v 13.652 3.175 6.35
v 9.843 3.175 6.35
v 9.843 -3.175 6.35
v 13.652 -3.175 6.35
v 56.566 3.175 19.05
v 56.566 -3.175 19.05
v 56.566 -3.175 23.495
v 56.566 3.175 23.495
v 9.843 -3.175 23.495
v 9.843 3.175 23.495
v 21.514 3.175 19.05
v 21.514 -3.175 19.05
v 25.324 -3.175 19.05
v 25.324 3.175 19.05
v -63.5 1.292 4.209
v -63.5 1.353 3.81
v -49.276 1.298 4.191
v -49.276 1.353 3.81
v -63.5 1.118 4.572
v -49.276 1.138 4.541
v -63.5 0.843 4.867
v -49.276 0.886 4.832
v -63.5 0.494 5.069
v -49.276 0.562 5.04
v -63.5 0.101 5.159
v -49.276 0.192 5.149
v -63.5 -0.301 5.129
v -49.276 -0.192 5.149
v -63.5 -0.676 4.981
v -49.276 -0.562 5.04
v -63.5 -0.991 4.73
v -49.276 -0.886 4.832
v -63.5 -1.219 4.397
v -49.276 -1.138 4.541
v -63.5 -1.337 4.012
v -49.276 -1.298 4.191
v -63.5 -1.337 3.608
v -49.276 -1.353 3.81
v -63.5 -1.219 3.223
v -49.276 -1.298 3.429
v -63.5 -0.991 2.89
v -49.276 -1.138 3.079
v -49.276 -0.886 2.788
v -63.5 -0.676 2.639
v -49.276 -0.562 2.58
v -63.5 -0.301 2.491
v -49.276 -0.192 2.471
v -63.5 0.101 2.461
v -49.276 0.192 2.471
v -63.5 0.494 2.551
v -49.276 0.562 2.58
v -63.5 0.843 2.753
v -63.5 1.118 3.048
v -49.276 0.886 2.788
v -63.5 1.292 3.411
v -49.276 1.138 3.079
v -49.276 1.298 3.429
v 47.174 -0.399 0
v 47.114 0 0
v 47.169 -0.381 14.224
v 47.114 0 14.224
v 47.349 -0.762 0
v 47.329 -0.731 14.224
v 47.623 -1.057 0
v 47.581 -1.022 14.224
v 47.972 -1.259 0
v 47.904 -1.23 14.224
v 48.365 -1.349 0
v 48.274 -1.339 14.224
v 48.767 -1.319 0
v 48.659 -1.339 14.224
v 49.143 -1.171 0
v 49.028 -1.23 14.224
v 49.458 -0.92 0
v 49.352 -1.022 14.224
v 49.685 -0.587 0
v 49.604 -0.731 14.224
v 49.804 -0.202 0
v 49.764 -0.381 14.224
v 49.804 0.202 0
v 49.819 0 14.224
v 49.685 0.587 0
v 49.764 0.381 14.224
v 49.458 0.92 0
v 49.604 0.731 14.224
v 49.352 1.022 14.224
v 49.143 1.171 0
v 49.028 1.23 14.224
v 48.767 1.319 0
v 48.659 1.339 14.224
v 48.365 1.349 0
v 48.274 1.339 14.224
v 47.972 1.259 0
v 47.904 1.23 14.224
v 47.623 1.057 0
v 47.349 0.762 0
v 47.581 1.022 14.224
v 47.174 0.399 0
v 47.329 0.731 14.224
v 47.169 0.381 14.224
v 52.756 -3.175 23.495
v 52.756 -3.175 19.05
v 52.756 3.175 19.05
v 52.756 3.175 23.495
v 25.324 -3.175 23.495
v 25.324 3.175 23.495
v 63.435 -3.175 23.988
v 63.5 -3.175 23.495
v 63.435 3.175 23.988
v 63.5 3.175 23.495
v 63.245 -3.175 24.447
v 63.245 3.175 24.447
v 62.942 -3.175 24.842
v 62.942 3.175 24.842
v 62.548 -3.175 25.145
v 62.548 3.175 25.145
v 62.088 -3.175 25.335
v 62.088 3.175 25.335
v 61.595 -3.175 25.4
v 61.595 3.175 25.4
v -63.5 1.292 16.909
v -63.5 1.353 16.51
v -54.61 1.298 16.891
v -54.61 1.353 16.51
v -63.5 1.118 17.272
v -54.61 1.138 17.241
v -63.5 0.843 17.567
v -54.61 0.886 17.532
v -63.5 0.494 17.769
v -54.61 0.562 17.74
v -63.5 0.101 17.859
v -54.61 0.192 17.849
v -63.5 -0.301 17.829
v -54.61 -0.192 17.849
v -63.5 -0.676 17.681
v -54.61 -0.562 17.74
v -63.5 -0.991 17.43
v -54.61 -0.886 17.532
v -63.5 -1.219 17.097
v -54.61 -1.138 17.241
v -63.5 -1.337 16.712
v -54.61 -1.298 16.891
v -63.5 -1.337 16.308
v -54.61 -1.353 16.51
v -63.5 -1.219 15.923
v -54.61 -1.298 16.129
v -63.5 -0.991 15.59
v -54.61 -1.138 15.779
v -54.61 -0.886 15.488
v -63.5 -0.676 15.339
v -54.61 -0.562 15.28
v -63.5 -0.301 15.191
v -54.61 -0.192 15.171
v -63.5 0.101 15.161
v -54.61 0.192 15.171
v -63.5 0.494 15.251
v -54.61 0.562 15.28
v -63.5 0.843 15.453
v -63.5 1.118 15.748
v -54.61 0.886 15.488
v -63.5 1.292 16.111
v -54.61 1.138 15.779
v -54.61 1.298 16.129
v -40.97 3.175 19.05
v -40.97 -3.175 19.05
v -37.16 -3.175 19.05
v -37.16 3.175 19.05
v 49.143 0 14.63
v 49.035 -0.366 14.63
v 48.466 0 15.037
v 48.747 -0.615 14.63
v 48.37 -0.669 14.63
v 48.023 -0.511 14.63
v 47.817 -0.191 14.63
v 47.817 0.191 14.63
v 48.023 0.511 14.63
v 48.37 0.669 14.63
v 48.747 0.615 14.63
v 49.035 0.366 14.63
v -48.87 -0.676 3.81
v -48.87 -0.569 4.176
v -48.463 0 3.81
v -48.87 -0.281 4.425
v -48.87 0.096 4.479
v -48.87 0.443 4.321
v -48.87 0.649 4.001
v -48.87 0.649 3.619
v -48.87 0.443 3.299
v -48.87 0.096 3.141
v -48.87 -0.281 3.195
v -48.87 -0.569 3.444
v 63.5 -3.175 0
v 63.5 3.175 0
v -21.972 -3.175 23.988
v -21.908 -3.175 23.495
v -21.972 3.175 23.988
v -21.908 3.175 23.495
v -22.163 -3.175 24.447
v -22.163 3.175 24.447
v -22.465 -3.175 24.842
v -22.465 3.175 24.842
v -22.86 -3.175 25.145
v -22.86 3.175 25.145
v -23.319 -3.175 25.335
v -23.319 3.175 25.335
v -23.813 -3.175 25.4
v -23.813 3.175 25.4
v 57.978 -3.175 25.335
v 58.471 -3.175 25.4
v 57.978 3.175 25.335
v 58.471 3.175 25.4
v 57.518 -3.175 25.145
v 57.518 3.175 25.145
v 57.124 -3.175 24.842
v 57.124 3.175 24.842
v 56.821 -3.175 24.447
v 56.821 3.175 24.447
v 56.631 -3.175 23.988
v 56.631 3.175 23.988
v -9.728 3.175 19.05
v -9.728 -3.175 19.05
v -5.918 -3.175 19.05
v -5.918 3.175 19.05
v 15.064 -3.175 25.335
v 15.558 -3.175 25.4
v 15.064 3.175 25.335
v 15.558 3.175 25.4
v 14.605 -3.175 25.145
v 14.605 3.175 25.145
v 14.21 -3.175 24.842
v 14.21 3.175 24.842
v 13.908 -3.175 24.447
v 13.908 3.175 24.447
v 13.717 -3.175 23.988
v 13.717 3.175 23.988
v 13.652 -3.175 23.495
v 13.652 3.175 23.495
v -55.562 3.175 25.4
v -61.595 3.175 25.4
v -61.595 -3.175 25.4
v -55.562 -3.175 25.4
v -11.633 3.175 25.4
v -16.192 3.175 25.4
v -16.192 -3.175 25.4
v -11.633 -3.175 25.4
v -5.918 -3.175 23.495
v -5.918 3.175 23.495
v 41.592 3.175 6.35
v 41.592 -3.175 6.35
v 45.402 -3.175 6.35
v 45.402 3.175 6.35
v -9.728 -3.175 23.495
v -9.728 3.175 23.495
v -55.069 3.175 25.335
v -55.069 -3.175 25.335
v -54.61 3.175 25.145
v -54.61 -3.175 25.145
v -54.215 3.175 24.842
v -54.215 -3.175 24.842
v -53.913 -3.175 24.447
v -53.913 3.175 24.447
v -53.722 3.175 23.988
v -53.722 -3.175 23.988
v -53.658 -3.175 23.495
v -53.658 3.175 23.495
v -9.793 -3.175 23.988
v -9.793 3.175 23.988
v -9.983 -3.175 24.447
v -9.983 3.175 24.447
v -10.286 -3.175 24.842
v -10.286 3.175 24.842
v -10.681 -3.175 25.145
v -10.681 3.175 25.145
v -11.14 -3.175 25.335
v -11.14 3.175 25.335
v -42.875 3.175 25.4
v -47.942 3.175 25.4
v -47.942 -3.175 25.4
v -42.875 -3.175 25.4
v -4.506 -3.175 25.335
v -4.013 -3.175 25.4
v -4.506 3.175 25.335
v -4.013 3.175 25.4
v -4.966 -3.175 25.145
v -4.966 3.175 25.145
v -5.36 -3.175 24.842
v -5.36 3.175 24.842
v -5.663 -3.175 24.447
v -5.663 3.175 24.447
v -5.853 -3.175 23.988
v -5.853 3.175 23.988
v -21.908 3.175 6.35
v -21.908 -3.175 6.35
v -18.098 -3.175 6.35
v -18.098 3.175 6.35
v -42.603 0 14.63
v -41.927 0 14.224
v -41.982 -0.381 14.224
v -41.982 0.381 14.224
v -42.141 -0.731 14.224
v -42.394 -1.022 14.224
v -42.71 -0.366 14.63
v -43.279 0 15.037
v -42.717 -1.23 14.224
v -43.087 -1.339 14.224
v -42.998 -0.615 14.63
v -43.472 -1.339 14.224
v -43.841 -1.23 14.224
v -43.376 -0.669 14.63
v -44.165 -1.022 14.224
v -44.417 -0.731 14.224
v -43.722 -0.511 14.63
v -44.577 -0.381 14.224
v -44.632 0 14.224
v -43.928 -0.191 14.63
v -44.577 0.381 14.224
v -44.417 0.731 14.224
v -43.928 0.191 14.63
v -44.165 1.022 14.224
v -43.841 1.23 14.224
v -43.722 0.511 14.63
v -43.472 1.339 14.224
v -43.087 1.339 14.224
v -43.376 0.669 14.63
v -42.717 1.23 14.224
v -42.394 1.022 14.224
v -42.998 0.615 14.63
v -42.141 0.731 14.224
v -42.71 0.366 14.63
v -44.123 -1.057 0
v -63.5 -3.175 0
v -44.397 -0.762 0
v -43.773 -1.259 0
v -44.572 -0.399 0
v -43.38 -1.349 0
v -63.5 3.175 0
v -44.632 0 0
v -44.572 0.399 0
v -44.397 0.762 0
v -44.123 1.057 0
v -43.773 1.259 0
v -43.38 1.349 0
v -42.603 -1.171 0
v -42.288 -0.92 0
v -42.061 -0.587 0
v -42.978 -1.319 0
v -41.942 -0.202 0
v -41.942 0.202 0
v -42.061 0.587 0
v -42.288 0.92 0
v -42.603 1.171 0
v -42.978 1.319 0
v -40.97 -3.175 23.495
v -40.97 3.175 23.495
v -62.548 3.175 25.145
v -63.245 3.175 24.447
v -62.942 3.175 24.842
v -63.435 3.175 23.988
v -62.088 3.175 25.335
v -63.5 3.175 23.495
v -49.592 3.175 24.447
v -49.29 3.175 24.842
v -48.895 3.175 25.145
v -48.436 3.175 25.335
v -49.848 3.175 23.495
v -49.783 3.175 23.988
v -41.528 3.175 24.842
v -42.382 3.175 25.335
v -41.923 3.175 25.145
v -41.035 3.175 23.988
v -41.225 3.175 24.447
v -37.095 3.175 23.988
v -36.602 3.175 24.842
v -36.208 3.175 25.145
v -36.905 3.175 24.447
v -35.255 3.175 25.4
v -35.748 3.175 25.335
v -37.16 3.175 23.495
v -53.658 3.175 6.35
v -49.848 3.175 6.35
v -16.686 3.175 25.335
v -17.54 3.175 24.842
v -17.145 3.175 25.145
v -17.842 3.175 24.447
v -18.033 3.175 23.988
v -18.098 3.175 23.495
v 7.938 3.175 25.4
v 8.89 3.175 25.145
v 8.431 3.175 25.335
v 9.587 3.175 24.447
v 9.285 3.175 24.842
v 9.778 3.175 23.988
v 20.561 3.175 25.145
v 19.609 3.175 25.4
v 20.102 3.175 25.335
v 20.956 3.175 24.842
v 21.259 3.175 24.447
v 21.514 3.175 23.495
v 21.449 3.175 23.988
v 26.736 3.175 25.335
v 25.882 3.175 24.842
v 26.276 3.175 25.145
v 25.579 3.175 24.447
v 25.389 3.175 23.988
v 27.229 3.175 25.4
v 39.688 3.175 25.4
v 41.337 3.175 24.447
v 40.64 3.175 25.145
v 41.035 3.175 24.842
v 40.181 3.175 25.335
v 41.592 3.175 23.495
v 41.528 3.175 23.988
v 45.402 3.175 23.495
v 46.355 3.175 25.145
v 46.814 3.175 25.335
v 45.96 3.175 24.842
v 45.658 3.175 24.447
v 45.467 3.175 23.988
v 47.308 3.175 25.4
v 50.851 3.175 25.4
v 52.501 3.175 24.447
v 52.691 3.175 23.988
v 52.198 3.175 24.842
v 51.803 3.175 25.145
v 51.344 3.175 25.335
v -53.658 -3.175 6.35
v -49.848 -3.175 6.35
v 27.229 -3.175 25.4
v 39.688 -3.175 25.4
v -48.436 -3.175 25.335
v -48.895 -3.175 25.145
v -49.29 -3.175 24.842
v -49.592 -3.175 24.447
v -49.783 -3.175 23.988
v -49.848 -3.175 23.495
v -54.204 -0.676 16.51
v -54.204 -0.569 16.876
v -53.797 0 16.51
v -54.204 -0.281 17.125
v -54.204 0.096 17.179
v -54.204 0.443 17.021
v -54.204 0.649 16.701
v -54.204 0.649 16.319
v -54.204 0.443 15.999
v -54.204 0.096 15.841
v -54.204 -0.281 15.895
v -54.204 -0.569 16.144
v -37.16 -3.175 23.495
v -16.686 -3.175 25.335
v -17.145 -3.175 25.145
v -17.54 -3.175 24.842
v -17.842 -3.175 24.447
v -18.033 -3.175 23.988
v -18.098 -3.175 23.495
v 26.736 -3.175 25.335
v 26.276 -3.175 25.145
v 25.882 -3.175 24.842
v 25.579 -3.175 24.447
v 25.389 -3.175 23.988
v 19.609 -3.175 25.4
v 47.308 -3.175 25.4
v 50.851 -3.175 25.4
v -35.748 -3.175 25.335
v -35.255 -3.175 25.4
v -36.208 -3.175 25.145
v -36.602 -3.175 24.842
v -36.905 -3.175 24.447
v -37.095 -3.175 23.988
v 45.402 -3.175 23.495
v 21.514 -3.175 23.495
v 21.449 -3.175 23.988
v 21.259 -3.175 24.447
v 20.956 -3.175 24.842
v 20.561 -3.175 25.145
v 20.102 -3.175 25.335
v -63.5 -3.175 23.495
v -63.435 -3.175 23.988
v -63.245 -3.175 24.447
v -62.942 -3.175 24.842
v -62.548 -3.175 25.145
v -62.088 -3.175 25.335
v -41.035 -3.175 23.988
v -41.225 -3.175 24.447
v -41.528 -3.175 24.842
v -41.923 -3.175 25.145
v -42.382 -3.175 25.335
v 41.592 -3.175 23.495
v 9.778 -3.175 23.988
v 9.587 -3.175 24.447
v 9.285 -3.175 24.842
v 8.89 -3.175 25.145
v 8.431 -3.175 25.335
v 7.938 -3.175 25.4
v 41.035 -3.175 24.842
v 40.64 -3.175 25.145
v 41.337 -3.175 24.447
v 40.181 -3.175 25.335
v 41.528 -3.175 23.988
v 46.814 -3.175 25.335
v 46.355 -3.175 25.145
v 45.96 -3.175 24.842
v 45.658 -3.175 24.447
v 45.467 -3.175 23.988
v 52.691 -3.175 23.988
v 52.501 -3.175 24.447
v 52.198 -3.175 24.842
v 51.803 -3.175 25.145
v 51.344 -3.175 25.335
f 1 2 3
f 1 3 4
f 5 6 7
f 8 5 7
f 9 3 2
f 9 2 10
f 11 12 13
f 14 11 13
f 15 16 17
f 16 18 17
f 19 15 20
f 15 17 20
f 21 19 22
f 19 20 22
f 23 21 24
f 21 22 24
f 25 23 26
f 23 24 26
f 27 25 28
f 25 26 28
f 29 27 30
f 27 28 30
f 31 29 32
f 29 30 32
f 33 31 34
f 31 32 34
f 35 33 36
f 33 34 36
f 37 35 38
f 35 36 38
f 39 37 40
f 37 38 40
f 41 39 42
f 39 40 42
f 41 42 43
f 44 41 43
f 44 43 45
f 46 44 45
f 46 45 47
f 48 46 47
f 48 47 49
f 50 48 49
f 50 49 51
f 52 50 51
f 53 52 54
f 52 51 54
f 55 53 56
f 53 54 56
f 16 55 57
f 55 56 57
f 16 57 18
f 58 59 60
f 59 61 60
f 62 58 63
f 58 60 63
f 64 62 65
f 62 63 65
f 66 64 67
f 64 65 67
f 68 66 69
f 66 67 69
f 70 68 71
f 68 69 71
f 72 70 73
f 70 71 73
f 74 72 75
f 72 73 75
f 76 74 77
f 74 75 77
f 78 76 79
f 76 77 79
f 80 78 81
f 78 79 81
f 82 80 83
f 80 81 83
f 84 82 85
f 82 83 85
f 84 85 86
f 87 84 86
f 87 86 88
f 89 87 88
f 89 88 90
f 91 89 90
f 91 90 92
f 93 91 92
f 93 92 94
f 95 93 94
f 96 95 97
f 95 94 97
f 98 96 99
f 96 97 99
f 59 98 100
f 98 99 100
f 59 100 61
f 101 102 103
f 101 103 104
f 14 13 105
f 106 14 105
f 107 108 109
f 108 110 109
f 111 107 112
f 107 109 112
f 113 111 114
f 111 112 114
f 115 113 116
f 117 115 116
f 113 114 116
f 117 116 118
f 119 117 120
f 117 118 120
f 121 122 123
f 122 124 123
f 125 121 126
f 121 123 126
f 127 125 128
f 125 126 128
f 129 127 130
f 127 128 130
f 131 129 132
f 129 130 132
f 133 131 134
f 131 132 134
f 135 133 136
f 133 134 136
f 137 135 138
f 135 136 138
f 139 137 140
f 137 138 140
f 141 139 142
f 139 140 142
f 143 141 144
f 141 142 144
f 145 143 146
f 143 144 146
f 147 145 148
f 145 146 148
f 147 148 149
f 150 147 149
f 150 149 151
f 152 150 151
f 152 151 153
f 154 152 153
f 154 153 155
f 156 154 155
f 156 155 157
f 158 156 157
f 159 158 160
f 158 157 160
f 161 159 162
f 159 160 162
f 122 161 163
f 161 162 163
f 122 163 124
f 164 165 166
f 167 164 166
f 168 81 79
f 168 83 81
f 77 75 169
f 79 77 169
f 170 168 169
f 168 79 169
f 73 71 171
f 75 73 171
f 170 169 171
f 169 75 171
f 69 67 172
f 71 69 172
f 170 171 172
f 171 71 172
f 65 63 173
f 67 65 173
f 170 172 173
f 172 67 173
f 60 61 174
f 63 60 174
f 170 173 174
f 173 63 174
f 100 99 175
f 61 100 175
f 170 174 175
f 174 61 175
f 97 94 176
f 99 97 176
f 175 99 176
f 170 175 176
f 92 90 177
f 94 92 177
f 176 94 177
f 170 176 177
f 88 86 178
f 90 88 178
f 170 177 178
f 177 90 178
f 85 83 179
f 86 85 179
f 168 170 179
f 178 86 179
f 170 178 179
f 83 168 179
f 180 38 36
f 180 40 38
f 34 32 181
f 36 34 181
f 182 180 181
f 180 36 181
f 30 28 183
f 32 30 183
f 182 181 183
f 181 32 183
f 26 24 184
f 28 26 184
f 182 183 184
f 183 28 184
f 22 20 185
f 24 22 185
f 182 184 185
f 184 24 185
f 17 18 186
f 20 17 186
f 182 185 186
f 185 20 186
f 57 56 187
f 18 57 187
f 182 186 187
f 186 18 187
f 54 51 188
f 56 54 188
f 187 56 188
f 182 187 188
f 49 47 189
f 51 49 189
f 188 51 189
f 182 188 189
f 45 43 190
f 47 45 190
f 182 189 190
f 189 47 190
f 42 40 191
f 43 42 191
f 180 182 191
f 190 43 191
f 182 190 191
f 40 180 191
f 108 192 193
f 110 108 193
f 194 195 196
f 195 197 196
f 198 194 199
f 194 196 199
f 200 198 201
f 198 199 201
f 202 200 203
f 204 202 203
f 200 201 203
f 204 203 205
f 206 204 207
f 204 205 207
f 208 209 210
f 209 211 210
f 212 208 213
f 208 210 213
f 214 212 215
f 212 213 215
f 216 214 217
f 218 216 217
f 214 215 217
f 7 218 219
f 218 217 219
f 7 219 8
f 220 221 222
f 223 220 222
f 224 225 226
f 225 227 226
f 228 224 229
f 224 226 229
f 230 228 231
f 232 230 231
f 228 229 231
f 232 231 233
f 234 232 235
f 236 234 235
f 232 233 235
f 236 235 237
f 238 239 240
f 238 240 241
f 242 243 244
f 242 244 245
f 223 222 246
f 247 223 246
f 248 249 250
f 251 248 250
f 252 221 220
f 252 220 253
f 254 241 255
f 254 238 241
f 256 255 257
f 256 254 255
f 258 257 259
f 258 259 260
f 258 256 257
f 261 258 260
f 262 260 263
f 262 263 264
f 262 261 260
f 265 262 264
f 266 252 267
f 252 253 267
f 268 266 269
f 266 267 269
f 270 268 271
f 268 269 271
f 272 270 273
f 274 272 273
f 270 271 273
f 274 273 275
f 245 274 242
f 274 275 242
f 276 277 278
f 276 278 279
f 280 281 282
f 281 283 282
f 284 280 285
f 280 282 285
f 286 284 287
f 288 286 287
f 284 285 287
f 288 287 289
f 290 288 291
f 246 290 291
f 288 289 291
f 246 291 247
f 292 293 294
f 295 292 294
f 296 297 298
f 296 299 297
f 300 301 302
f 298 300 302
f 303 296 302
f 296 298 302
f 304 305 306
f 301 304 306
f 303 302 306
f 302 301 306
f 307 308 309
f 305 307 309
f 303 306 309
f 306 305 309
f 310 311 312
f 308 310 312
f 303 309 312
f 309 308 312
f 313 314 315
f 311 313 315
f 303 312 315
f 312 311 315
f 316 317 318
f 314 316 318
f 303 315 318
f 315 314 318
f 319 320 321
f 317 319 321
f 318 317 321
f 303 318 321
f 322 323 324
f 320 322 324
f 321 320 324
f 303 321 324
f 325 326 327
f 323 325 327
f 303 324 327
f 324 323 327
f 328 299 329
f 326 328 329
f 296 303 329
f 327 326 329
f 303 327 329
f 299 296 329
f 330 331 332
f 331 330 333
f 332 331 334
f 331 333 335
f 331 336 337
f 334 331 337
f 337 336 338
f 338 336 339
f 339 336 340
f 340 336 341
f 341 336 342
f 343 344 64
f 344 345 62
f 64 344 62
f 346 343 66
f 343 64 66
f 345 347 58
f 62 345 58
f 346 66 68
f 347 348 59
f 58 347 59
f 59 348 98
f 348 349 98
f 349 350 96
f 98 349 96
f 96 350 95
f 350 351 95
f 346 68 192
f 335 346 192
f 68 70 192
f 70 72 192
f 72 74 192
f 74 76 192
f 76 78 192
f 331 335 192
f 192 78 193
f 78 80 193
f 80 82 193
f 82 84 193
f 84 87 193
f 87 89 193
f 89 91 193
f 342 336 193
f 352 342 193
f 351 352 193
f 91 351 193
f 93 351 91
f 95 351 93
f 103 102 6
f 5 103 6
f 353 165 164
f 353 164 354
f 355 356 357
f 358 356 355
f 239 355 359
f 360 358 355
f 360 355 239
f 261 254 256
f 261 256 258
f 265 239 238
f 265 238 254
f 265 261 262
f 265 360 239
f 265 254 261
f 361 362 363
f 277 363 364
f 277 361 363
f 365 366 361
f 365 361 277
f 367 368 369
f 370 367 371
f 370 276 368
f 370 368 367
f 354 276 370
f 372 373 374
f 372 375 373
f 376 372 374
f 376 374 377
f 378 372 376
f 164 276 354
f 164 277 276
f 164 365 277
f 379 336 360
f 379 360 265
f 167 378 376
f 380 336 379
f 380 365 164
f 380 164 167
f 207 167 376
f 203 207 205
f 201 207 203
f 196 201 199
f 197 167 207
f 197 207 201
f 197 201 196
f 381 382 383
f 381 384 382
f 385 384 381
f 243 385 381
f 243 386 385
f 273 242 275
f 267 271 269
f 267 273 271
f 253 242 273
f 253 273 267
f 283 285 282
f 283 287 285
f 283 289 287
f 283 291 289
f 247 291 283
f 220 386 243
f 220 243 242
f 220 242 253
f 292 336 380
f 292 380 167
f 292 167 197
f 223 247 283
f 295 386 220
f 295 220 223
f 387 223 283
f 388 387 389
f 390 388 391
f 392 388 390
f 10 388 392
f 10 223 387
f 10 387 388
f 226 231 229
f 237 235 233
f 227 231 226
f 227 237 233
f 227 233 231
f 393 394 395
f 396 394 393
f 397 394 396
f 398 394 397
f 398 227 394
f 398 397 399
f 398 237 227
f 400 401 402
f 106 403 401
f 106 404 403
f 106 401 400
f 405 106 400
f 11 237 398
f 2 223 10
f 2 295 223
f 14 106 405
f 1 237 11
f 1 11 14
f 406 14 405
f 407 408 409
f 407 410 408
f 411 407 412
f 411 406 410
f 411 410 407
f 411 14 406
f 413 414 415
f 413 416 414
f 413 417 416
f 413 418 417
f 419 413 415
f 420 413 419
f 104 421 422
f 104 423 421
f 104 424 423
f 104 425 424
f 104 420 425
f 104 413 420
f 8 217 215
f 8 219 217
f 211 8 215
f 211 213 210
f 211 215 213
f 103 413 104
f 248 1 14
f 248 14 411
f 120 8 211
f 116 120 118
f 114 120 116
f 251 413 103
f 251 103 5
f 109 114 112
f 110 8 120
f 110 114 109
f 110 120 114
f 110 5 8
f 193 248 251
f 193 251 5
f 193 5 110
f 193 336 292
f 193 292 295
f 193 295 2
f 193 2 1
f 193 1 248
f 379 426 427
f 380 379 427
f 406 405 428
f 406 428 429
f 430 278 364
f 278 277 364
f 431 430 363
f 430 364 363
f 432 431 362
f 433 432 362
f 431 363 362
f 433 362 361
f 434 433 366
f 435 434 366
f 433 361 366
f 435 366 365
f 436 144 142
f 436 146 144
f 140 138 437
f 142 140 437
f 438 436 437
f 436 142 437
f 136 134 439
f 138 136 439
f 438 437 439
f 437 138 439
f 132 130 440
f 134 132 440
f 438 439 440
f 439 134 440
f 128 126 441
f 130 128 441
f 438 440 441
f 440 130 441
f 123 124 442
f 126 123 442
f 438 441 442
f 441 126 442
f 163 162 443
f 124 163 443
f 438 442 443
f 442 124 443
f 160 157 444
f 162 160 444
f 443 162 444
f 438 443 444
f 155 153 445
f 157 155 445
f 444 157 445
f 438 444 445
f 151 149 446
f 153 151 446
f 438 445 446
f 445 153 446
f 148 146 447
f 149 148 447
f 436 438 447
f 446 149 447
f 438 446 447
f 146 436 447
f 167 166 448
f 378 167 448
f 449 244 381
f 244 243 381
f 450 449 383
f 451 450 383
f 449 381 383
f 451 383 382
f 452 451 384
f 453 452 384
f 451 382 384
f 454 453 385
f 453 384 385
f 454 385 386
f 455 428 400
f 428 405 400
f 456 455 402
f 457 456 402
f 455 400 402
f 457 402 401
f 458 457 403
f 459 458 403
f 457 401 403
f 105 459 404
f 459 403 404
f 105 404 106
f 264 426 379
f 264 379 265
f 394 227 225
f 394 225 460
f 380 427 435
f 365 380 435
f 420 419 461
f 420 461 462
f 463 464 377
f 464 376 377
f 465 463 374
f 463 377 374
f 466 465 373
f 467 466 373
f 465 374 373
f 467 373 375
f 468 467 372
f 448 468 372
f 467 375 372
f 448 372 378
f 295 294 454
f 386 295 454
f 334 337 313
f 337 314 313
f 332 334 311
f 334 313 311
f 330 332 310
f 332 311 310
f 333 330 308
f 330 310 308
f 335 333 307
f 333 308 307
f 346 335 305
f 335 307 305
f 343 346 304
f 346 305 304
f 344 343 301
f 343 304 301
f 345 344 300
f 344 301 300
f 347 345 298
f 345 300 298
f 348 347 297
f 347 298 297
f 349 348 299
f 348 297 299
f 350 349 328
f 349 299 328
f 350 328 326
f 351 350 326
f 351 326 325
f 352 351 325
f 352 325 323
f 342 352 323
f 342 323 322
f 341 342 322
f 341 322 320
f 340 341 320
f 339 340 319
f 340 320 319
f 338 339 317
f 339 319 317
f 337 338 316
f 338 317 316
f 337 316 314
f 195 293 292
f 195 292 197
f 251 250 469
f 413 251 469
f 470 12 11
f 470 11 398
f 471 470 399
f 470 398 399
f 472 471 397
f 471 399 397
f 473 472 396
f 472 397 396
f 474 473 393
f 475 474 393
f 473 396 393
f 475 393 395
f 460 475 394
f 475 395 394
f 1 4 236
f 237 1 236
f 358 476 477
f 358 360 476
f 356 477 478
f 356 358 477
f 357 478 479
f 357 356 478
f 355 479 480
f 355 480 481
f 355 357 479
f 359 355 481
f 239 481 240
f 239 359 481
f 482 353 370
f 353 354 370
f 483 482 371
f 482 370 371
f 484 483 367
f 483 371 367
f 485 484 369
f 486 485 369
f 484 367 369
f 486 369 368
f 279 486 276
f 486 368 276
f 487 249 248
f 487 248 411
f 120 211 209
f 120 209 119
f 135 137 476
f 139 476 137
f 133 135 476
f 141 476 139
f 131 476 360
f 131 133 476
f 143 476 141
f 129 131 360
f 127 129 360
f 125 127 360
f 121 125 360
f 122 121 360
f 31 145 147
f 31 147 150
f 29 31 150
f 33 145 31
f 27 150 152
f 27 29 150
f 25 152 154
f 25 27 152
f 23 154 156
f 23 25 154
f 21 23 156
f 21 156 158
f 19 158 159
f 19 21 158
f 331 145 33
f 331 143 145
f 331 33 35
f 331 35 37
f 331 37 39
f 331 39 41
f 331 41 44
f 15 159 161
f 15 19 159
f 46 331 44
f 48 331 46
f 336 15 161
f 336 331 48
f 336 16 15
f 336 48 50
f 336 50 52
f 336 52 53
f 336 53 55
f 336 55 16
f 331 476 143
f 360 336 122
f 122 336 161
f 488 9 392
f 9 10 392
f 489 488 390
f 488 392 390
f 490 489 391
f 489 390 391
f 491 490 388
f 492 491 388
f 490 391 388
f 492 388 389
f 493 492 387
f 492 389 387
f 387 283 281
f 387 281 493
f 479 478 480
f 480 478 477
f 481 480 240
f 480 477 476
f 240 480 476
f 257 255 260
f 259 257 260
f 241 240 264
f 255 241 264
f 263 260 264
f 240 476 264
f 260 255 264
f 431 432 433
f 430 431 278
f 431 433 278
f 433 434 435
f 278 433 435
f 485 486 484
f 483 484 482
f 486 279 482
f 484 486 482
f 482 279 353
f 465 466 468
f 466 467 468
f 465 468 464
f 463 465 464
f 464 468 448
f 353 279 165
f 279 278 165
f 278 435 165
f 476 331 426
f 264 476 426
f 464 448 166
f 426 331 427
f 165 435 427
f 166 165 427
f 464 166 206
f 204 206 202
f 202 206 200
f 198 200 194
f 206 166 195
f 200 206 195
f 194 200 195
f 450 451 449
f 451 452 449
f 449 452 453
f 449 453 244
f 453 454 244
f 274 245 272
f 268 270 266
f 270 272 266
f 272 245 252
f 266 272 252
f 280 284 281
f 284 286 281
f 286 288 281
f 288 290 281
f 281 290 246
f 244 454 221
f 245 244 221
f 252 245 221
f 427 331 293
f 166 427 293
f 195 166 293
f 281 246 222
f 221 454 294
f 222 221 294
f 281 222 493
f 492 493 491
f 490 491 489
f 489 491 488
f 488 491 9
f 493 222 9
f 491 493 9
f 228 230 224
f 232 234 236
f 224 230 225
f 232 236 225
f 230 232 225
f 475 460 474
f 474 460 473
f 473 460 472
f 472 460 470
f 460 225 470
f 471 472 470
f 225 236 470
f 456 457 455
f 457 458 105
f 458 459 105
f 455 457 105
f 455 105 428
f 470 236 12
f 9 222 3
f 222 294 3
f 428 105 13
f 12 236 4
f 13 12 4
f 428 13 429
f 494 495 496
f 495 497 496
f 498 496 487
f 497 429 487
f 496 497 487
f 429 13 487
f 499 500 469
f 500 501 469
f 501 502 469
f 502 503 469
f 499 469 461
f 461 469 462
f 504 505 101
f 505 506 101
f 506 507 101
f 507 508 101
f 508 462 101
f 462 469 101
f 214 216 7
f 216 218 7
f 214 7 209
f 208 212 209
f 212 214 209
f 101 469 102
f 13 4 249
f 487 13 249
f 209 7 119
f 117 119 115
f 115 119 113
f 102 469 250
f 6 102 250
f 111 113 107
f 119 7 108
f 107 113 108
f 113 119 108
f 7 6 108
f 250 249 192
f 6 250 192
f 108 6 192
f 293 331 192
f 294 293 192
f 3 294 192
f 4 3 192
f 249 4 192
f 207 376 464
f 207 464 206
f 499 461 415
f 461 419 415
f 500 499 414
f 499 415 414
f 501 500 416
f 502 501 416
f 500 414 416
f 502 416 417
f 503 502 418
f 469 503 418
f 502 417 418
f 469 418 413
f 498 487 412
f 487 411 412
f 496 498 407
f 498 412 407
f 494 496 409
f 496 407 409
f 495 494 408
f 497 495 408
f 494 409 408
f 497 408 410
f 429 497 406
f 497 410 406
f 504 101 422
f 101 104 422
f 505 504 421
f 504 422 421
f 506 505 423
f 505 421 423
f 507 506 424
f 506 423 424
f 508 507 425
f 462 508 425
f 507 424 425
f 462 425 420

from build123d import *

# Parameters (mm, degrees)
F0_W           = 127
F0_H           = 6.35
F1_DEPTH       = 25.4
F2_W           = 3.81
F2_H           = 19.05
F2_H_2         = 6.35
F3_DEPTH       = 6.35
F4_R           = 1.905
F7_D           = 2.7051
F7_DEPTH       = 14.224
F7_TIP         = 0.8126940303
F7_ON_F6_D     = 2.7051
F7_ON_F6_DEPTH = 14.224
F7_ON_F6_TIP   = 0.8126940303
F8_D           = 2.7051
F8_DEPTH       = 8.89
F8_TIP         = 0.8126940303


with BuildPart() as f1:
    # F0 (on Top) → F1 (new body)
    with BuildSketch(Plane.XY):
        Rectangle(F0_W, F0_H)
    extrude(amount=F1_DEPTH)

    # F2 (on face) → F3 (cut, through all)
    with BuildSketch(Plane.XZ.offset(3.175)):
        with Locations((-51.7525, 15.875)):
            Rectangle(F2_W, F2_H)
        with Locations((-20.0025, 15.875)):
            Rectangle(F2_W, F2_H)
        with Locations((11.7475, 15.875)):
            Rectangle(F2_W, F2_H)
        with Locations((43.4975, 15.875)):
            Rectangle(F2_W, F2_H)
        with Locations((-39.0652, 22.225)):
            Rectangle(F2_W, F2_H_2)
        with Locations((-7.8232, 22.225)):
            Rectangle(F2_W, F2_H_2)
        with Locations((23.4188, 22.225)):
            Rectangle(F2_W, F2_H_2)
        with Locations((54.6608, 22.225)):
            Rectangle(F2_W, F2_H_2)
    extrude(amount=-F3_DEPTH, mode=Mode.SUBTRACT)

    # F4
    f4_edges = [f1.edges().sort_by_distance(p)[0] for p in [
        (-53.6575, 0, 25.4),
        (-49.8475, 0, 25.4),
        (-21.9075, 0, 25.4),
        (-18.0975, 0, 25.4),
        (9.8425, 0, 25.4),
        (13.6525, 0, 25.4),
        (41.5925, 0, 25.4),
        (45.4025, 0, 25.4),
        (-40.9702, 0, 25.4),
        (-37.1602, 0, 25.4),
        (-9.7282, 0, 25.4),
        (-5.9182, 0, 25.4),
        (21.5138, 0, 25.4),
        (25.3238, 0, 25.4),
        (52.7558, 0, 25.4),
        (56.5658, 0, 25.4),
        (63.5, 0, 25.4),
        (-63.5, 0, 25.4),
    ]]
    fillet(f4_edges, radius=F4_R)

    # F7
    with Locations(Plane(origin=(0, 0, 0), x_dir=(1, 0, 0), z_dir=(0, 0, -1))):
        with Locations((-43.2793162763, 0), (48.466347158, 0)):
            Hole(F7_D / 2, depth=F7_DEPTH)
            with Locations((0, 0, -(F7_DEPTH + F7_TIP / 2))):  # 118° drill point
                Cone(0, F7_D / 2, F7_TIP, mode=Mode.SUBTRACT)

    # F7 on F6
    with Locations(Plane(origin=(-63.5, 0, 0), x_dir=(0, -1, 0), z_dir=(-1, 0, 0))):
        with Locations((0, 3.81)):
            Hole(F7_ON_F6_D / 2, depth=F7_ON_F6_DEPTH)
            with Locations((0, 0, -(F7_ON_F6_DEPTH + F7_ON_F6_TIP / 2))):  # 118° drill point
                Cone(0, F7_ON_F6_D / 2, F7_ON_F6_TIP, mode=Mode.SUBTRACT)

    # F8
    with Locations(Plane(origin=(-63.5, 0, 0), x_dir=(0, -1, 0), z_dir=(-1, 0, 0))):
        with Locations((0, 16.51)):
            Hole(F8_D / 2, depth=F8_DEPTH)
            with Locations((0, 0, -(F8_DEPTH + F8_TIP / 2))):  # 118° drill point
                Cone(0, F8_D / 2, F8_TIP, mode=Mode.SUBTRACT)


solid = f1.part
